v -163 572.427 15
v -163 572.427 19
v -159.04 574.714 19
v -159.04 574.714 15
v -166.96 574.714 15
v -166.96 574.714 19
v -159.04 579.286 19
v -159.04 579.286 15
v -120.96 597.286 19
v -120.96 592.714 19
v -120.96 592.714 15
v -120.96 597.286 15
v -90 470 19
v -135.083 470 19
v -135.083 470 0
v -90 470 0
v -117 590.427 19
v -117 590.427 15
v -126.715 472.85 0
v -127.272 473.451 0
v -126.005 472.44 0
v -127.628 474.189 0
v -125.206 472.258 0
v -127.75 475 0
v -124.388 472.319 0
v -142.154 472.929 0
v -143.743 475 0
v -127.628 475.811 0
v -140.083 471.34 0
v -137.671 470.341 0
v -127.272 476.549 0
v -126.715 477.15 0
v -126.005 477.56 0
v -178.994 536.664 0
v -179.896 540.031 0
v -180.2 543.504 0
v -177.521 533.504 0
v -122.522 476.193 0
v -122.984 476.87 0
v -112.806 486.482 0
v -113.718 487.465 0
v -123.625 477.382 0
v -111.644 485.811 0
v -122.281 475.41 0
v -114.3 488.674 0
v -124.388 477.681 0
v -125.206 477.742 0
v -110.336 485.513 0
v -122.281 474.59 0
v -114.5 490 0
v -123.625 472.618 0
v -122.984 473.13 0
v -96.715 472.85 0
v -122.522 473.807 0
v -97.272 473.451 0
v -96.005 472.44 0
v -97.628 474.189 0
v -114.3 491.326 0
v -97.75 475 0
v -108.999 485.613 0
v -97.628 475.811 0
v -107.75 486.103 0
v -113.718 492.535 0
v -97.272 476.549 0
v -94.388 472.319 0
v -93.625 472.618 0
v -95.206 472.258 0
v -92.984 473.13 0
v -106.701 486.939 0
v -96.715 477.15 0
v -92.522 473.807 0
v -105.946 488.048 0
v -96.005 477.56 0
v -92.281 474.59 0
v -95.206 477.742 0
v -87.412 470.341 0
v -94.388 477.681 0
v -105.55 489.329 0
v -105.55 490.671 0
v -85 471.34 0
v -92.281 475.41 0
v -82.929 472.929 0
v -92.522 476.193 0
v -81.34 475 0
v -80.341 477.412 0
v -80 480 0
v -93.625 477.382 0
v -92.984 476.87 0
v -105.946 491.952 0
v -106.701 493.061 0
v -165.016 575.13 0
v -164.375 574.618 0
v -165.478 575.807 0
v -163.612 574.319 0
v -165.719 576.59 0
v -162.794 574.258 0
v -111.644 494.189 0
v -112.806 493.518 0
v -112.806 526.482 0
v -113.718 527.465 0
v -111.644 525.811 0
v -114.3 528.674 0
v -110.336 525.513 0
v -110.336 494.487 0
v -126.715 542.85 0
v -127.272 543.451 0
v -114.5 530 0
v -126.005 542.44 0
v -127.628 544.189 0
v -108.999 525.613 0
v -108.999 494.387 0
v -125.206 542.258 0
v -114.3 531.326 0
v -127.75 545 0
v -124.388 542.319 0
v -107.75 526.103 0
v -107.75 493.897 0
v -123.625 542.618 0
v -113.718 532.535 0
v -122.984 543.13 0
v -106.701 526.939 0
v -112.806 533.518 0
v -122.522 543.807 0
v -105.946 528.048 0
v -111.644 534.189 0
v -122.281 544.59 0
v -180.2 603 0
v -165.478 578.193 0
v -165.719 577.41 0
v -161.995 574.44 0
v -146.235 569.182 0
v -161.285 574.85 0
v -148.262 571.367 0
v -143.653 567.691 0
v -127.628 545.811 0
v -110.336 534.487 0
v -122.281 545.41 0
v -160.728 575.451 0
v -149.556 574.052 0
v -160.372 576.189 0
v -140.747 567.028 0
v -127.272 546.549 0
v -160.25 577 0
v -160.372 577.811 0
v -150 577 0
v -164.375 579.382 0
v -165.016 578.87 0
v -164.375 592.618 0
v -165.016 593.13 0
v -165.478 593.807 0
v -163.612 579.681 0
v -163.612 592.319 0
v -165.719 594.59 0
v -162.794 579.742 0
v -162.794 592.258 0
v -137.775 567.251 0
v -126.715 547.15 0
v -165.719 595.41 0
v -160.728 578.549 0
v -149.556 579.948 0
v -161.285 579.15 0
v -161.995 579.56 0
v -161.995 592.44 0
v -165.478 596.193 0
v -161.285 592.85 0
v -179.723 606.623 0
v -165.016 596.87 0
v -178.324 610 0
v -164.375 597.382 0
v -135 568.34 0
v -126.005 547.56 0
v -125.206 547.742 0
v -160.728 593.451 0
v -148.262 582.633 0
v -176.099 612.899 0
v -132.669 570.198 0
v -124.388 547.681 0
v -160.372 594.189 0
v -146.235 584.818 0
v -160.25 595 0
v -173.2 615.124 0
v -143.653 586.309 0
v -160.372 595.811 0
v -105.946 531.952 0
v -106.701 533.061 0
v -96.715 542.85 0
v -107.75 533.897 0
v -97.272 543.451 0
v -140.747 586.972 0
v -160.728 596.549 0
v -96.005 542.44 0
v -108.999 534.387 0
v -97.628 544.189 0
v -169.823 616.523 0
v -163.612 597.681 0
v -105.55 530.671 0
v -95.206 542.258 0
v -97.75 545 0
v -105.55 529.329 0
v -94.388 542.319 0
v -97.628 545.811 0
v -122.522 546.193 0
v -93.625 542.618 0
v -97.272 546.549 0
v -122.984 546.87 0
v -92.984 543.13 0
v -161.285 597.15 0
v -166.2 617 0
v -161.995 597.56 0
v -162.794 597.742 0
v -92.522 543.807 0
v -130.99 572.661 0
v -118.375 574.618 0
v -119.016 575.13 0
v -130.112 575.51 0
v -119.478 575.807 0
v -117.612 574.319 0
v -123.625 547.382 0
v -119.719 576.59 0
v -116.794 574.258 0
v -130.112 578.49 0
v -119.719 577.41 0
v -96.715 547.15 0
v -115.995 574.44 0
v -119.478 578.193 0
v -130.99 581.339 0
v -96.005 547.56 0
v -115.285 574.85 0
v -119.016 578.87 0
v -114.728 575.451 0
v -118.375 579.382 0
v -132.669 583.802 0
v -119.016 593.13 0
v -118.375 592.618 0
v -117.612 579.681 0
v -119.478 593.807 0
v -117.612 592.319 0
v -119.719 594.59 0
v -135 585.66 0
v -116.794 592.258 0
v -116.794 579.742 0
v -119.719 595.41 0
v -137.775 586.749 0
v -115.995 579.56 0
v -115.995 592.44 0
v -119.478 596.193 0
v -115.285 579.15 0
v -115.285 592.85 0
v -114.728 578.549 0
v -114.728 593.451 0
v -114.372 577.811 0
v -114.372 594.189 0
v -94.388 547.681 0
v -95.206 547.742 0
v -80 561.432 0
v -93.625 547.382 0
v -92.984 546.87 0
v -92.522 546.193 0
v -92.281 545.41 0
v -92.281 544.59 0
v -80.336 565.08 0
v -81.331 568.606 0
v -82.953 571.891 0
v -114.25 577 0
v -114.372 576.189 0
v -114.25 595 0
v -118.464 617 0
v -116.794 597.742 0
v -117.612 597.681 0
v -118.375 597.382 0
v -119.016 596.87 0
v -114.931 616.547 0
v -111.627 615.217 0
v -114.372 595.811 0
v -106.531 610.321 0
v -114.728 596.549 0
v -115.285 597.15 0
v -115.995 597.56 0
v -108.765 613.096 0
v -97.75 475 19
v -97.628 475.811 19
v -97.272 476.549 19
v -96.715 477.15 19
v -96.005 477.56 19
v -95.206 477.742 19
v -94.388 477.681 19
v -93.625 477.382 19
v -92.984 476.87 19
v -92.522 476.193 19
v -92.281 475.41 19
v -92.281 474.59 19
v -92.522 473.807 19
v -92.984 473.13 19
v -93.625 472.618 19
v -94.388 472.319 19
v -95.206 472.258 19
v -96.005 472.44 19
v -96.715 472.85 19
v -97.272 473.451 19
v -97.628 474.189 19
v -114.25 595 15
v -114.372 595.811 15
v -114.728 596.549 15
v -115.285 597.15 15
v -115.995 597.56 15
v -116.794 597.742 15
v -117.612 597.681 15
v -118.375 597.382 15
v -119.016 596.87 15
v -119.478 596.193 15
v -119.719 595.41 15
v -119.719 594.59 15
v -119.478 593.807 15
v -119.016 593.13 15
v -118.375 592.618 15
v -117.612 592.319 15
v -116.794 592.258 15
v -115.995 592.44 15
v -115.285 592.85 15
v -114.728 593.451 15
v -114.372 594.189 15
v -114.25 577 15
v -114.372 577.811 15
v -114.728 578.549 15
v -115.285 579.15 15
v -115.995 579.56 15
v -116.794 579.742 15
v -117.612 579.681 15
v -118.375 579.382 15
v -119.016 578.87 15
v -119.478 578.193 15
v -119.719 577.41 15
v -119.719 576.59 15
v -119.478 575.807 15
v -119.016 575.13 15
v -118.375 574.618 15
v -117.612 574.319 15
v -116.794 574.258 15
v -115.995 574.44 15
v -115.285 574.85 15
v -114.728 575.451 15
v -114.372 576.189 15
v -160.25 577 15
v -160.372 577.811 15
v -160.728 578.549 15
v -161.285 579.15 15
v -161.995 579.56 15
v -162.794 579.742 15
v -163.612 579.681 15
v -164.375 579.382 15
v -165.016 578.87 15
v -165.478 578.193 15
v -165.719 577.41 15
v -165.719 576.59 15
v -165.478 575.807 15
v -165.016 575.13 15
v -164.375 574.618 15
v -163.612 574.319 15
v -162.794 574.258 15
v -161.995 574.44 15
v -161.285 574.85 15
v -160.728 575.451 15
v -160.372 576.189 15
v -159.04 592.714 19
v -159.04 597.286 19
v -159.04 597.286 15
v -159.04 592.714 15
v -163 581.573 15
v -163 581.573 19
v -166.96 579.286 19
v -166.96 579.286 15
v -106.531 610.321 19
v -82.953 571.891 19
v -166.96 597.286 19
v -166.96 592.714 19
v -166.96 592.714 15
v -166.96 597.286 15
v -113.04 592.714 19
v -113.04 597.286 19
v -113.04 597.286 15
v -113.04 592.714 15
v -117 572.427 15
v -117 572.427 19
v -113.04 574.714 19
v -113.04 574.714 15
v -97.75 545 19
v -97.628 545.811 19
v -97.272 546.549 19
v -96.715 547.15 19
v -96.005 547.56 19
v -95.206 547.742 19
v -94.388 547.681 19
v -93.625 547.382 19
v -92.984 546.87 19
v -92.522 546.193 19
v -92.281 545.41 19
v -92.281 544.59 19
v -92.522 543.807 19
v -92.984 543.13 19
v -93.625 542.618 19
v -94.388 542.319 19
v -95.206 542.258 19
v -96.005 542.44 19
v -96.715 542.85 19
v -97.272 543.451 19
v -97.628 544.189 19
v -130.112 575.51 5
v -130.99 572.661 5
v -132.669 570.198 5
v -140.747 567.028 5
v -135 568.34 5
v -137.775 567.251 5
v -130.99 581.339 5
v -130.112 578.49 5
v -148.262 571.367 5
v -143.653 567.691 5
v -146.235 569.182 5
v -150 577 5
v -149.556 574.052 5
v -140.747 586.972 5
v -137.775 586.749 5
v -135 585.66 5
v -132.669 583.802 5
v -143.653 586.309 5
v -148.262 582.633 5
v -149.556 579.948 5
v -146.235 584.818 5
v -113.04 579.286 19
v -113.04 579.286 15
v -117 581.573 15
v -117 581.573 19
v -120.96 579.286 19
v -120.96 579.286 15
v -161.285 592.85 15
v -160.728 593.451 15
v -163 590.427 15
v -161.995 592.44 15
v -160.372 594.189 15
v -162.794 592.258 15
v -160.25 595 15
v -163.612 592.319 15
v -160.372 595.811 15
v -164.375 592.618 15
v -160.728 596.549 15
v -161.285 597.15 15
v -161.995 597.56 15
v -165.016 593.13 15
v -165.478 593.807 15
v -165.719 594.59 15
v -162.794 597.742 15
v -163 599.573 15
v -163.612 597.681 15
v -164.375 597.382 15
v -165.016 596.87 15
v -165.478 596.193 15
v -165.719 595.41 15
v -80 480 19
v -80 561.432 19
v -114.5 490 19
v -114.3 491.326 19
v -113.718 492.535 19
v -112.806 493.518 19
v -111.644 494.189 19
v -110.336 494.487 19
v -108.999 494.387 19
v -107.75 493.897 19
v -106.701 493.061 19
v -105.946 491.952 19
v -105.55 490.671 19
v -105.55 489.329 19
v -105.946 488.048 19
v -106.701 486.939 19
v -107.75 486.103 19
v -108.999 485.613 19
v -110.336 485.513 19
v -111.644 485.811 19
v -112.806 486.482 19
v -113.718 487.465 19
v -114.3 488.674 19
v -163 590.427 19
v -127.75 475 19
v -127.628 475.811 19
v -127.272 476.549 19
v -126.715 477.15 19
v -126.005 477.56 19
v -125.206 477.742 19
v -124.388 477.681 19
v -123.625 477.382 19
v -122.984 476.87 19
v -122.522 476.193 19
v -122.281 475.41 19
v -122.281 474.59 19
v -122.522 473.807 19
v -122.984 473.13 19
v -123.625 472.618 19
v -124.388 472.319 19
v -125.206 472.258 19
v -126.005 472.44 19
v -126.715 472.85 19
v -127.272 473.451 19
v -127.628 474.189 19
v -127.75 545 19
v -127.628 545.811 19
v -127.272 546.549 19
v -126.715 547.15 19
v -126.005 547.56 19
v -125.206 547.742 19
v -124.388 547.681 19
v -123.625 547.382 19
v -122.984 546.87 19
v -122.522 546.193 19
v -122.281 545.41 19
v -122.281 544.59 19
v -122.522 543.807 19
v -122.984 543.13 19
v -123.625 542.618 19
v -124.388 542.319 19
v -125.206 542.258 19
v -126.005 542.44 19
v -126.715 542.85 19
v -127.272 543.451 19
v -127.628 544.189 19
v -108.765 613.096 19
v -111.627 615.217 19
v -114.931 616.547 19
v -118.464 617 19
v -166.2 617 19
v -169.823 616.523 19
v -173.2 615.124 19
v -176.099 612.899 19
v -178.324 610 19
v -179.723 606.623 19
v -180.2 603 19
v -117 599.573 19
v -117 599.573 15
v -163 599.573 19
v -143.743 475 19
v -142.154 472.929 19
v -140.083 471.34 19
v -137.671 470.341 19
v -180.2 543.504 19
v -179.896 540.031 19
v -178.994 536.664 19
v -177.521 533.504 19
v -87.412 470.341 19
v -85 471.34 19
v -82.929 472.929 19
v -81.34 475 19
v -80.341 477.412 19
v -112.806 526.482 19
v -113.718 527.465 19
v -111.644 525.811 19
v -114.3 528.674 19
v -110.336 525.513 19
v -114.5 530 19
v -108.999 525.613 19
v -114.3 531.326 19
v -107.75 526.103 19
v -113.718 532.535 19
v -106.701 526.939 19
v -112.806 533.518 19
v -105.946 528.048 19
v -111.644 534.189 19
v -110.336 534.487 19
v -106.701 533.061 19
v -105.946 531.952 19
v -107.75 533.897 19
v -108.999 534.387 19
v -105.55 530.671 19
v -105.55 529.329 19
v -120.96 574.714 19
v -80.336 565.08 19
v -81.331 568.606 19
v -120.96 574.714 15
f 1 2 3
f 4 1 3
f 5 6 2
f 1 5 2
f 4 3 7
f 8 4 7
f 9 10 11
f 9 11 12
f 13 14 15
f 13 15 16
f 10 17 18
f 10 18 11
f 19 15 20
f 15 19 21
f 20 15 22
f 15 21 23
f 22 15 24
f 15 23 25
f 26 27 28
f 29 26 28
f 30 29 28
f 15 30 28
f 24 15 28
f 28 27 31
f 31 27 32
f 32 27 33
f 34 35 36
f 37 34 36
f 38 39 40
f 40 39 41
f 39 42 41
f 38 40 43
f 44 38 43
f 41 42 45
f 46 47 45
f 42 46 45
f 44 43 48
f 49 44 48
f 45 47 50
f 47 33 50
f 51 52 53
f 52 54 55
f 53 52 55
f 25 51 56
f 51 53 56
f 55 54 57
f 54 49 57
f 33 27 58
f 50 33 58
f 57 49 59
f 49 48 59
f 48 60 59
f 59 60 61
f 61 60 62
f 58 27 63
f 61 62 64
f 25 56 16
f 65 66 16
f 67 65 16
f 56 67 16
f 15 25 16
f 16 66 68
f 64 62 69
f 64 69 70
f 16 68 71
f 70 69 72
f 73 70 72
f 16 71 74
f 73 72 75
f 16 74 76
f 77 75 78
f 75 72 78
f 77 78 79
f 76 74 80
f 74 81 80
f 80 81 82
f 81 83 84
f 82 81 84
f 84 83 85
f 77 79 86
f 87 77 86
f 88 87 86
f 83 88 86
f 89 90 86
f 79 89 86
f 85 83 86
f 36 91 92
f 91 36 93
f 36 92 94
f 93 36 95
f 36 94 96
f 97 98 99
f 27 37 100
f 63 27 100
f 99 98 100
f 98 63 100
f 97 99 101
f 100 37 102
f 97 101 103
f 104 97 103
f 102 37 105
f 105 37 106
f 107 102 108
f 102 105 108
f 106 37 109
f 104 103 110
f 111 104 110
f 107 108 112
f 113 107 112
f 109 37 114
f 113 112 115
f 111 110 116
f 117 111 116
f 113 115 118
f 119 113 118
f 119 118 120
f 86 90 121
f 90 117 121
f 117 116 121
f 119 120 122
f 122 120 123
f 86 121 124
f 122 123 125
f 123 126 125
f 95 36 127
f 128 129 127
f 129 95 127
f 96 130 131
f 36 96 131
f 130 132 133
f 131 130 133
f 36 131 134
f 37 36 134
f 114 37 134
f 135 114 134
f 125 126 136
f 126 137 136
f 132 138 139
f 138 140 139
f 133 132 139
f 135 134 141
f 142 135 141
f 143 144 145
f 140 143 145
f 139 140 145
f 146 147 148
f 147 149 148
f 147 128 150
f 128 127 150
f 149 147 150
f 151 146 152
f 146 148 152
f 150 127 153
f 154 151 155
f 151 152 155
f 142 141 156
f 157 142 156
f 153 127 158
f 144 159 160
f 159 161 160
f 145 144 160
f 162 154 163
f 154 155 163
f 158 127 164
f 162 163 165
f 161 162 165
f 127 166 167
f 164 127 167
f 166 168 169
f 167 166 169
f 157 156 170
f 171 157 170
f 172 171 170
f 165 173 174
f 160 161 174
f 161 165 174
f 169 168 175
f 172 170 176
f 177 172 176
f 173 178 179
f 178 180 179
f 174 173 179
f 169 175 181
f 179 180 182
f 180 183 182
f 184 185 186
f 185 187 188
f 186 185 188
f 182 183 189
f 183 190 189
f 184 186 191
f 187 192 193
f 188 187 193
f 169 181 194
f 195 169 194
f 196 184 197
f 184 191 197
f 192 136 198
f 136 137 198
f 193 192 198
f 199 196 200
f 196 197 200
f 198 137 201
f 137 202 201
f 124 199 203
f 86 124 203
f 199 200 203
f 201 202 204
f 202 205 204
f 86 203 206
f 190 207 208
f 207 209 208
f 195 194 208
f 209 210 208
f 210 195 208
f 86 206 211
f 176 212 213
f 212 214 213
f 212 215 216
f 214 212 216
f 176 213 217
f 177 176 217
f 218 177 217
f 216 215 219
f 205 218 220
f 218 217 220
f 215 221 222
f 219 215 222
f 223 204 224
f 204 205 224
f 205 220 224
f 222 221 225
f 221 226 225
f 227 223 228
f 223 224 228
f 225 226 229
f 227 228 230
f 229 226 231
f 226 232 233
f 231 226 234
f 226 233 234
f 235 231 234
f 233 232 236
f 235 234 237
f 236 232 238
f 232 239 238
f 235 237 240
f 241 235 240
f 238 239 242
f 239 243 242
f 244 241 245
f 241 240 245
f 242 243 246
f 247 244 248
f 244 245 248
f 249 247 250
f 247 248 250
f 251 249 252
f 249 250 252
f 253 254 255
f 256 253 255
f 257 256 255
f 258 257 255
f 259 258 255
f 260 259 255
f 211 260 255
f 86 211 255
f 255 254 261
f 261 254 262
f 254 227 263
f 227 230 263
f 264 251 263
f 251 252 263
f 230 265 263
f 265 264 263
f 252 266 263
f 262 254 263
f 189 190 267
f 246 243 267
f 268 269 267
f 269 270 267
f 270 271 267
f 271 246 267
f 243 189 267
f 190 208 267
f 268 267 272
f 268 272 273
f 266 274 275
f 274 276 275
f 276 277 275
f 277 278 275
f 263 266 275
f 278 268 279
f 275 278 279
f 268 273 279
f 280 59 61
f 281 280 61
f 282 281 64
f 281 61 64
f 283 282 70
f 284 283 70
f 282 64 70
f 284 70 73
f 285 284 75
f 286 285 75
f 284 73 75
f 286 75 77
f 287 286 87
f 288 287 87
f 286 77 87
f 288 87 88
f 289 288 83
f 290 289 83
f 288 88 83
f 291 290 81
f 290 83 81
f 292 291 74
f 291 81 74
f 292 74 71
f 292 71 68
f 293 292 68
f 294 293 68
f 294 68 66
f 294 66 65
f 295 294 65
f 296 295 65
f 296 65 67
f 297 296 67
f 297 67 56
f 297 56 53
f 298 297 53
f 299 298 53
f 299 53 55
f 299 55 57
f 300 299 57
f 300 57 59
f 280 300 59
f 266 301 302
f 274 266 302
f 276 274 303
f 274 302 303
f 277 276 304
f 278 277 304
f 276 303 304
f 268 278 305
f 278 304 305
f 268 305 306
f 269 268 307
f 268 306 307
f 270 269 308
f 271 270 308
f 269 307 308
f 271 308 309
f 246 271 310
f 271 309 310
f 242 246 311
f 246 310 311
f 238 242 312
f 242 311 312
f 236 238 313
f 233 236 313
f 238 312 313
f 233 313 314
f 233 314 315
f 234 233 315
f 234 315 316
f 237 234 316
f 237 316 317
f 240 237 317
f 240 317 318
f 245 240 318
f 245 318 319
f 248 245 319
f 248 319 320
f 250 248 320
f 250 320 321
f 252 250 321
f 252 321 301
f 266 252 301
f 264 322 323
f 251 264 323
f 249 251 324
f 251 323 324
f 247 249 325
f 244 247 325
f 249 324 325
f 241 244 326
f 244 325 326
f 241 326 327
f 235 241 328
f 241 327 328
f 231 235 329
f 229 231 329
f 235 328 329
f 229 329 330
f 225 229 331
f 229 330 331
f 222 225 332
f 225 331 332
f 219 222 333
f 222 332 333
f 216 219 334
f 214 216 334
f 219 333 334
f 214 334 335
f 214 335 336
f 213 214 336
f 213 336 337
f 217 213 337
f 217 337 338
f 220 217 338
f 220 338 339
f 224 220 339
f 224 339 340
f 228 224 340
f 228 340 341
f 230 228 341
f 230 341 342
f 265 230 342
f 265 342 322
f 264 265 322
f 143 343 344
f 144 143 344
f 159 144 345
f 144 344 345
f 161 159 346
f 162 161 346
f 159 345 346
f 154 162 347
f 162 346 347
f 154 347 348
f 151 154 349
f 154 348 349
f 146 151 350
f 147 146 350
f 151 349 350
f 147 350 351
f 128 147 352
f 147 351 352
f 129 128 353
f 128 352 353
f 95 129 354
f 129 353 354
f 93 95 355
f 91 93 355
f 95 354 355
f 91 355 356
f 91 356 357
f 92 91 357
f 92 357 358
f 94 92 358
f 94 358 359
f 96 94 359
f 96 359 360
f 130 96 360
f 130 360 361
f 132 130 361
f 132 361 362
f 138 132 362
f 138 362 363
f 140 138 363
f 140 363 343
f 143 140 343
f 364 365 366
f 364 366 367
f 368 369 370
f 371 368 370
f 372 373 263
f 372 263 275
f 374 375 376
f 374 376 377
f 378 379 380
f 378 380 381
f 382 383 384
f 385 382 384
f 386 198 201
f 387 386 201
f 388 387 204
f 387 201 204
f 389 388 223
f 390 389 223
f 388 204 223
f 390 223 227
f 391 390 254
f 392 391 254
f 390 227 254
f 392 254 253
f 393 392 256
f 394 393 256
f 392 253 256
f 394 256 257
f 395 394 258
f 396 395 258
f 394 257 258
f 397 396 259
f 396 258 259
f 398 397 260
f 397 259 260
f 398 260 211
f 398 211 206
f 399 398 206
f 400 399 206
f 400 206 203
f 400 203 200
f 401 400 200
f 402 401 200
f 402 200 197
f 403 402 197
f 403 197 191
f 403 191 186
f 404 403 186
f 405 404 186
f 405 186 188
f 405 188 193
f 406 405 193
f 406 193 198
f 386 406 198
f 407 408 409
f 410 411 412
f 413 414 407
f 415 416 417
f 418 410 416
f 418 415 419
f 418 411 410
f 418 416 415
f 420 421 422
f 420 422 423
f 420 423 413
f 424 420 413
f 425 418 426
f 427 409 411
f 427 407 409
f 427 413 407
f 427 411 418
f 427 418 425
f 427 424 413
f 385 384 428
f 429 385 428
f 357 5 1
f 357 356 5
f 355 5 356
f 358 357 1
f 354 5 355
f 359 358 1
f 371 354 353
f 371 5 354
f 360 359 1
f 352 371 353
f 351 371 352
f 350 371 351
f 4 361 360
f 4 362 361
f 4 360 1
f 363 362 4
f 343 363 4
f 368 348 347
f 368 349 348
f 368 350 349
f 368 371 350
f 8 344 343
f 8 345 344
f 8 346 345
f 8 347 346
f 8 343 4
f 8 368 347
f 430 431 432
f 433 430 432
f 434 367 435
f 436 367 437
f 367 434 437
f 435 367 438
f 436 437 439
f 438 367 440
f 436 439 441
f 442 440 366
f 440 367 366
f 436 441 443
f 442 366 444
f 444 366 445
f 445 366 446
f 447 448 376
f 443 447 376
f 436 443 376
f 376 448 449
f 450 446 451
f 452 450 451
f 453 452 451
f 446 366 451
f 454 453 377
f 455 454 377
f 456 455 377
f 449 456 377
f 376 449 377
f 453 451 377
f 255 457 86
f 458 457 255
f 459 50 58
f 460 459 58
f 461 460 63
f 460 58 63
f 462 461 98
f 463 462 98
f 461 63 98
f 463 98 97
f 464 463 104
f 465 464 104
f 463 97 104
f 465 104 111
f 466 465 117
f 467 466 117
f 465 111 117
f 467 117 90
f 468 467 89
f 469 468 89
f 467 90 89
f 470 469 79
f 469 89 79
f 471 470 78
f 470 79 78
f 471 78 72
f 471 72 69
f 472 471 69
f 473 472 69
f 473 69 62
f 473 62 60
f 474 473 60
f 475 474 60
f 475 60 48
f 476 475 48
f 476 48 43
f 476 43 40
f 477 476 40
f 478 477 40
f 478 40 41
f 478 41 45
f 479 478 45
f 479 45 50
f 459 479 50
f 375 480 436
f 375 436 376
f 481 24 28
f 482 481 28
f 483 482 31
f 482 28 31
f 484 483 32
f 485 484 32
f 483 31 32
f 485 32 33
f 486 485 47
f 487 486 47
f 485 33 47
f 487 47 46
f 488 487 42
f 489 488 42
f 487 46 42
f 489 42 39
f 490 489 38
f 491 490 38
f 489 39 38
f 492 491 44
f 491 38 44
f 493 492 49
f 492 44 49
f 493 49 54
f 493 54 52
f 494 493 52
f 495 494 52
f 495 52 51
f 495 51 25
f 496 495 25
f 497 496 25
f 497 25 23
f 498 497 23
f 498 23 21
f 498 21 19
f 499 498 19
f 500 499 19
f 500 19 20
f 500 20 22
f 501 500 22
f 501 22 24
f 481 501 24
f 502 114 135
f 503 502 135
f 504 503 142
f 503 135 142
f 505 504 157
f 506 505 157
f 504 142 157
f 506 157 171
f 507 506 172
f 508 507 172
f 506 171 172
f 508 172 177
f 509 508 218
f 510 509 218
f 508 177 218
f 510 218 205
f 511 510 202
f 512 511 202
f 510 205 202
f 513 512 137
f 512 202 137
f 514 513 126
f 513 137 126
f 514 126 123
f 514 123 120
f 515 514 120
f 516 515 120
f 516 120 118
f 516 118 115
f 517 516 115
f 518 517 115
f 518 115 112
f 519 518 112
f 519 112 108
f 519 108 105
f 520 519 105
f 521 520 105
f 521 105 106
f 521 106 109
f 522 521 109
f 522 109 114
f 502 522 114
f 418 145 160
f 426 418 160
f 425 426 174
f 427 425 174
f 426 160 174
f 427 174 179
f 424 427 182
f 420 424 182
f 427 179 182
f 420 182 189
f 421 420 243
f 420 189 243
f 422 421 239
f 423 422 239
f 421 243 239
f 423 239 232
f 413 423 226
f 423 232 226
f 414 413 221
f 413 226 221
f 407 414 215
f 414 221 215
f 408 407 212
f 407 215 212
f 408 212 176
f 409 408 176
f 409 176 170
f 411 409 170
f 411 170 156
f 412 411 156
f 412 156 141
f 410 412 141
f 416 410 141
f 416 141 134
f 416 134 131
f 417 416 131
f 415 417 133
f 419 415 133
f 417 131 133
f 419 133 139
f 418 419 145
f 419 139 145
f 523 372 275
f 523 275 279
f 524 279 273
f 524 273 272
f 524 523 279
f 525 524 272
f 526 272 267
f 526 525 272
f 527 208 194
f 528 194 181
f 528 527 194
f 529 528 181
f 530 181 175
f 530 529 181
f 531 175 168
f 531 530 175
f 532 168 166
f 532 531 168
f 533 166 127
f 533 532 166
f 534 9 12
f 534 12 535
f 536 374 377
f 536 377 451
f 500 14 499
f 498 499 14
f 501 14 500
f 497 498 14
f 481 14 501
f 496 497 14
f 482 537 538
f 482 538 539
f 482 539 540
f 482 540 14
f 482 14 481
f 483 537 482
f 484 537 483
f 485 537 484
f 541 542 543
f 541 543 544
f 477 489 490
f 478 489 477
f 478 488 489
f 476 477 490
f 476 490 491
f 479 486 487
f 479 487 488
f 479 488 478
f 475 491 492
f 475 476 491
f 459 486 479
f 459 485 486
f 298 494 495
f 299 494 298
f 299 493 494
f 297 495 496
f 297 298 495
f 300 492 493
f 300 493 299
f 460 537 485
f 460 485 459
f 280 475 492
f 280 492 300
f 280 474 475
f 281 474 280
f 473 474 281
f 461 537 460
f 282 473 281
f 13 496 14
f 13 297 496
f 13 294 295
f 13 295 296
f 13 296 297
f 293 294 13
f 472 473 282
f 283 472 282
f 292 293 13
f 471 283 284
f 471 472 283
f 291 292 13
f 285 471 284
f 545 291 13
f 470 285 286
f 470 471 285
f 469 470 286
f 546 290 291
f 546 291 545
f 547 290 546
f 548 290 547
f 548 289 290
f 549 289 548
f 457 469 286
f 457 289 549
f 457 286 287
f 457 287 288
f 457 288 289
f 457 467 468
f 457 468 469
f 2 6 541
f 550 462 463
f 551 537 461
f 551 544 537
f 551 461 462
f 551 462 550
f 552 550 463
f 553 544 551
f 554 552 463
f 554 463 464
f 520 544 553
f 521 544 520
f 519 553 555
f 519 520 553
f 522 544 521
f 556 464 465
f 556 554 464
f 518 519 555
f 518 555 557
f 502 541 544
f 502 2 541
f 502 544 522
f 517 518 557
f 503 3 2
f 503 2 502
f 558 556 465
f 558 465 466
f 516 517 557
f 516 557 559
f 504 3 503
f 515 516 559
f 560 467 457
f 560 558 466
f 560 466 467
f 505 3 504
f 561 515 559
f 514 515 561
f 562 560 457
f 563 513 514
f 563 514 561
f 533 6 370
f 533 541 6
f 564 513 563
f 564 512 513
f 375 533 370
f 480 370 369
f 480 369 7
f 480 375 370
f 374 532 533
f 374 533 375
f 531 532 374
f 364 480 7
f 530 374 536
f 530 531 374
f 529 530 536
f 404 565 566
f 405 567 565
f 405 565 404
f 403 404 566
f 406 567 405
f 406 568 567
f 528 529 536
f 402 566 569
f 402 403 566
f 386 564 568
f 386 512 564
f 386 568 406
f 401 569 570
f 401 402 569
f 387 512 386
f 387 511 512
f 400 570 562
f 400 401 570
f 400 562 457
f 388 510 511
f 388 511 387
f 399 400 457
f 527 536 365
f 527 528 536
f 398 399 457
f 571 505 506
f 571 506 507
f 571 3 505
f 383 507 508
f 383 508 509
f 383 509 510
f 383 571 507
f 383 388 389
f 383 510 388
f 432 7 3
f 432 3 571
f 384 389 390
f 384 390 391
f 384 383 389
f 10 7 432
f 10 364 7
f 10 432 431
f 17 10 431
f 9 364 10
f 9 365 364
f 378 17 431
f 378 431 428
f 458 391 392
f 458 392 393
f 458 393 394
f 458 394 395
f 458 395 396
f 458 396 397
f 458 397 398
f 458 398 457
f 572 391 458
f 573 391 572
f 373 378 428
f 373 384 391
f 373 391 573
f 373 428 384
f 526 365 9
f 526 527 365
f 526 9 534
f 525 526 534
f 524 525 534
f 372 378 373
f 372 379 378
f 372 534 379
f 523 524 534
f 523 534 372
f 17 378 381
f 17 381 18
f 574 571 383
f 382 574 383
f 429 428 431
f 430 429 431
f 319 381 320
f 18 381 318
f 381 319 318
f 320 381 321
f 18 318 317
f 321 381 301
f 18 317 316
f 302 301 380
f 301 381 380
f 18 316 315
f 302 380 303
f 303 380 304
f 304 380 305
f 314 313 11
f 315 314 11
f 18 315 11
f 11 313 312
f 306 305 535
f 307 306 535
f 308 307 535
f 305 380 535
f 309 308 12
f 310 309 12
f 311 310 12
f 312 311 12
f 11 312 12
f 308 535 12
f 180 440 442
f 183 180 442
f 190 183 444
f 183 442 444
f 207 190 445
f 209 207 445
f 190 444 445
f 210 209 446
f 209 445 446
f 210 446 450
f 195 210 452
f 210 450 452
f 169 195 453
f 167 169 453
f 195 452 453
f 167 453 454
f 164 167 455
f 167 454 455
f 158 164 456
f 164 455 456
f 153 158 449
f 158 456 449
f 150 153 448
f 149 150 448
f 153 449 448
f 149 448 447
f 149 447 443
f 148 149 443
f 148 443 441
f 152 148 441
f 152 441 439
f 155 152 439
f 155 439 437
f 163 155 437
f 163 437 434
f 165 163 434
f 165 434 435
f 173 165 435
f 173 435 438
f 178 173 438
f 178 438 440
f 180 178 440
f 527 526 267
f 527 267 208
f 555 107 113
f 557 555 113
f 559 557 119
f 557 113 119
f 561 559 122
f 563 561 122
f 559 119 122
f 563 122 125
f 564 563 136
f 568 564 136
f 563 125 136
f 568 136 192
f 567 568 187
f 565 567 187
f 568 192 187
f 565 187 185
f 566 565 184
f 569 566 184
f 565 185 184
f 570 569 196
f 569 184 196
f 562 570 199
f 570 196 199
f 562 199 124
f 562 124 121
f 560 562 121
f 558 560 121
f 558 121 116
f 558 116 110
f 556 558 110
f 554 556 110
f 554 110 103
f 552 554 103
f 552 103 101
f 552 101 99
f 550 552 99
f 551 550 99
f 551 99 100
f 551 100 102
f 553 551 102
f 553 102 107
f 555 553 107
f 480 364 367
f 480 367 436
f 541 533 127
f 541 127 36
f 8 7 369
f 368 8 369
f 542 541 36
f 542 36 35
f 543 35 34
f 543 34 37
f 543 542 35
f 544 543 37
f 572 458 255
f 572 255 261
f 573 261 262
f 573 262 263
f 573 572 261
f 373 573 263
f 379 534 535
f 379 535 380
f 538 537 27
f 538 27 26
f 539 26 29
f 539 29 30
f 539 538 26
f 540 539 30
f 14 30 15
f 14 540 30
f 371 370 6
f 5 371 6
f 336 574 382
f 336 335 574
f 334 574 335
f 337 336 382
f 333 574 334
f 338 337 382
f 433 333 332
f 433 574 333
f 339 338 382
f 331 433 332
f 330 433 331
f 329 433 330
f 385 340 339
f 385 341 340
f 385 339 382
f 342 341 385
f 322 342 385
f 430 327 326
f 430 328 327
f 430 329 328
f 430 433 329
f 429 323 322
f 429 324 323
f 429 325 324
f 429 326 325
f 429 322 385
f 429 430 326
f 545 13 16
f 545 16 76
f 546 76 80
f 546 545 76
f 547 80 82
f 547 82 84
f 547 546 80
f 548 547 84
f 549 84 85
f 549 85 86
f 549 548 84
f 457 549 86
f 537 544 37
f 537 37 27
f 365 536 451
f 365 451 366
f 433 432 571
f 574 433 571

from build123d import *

# Parameters (mm, degrees)
BOSS_EXTRUDE1_DEPTH  = 19
FILLET1_R            = 10
M5_CLEARANCE_HOLE2_D = 5.5
M5_CLEARANCE_HOLE1_D = 5.5
FILLET2_R            = 4
BOSS_EXTRUDE2_DEPTH  = 19
M8_CLEARANCE_HOLE1_D = 9
CUT_EXTRUDE2_DEPTH   = 4
SKETCH16_R           = 10
CUT_EXTRUDE3_DEPTH   = 5


with BuildPart() as part:
    # Sketch1 → Boss-Extrude1 (new body)
    with BuildSketch(Plane.XY):
        with BuildLine():
            Line((-170.200000001, 540.824594888), (-129.309401077, 470))
            Line((-129.309401077, 470), (-93, 470))
            ThreePointArc((-93, 470), (-90.878679656, 470.878679656), (-90, 473))
            Line((-90, 473), (-90, 564.25527297))
            Line((-90, 564.25527297), (-116.225329238, 607))
            Line((-116.225329238, 607), (-170.200000001, 607))
            Line((-170.200000001, 607), (-170.200000001, 540.824594888))
        make_face()
    extrude(amount=BOSS_EXTRUDE1_DEPTH)

    # Fillet1
    fillet1_edges = [part.edges().sort_by_distance(p)[0] for p in [
        (-90, 564.25527297, 9.5),
        (-129.309401077, 470, 9.5),
        (-170.200000001, 540.824594888, 9.5),
    ]]
    fillet(fillet1_edges, radius=FILLET1_R)

    # M5 Clearance Hole2 (through all)
    with Locations(Plane(origin=(0, 0, 0), x_dir=(-1, 0, 0), z_dir=(0, 0, -1))):
        with Locations((117.000000001, 595), (117.000000001, 577), (163.000000001, 577), (163.000000001, 595)):
            Hole(M5_CLEARANCE_HOLE2_D / 2)

    # M5 Clearance Hole1 (through all)
    with Locations(Plane.XY.offset(19)):
        with Locations((-95, 545), (-125, 545), (-125, 475), (-95, 475), (-110, 490), (-110, 530)):
            Hole(M5_CLEARANCE_HOLE1_D / 2)

    # Fillet2
    fillet2_edges = [part.edges().sort_by_distance(p)[0] for p in [
        (-116.225329238, 607, 9.5),
        (-170.200000001, 607, 9.5),
    ]]
    fillet(fillet2_edges, radius=FILLET2_R)

    # Sketch11 → Boss-Extrude2 (add)
    with BuildSketch(Plane.XY.offset(19)):
        with BuildLine():
            ThreePointArc((-143.743157806, 475), (-140.082903769, 471.339745962), (-135.082903769, 470))
            Line((-135.082903769, 470), (-123.535898385, 470))
            ThreePointArc((-123.535898385, 470), (-128.535898385, 471.339745962), (-132.196152423, 475))
            Line((-132.196152423, 475), (-168.860254039, 538.504086813))
            ThreePointArc((-168.860254039, 538.504086813), (-169.859258264, 540.915896362), (-170.200000001, 543.504086813))
            Line((-170.200000001, 543.504086813), (-170.200000001, 603))
            ThreePointArc((-170.200000001, 603), (-169.028427125, 605.828427125), (-166.200000001, 607))
            Line((-166.200000001, 607), (-118.464037729, 607))
            ThreePointArc((-118.464037729, 607), (-116.510482263, 606.490504411), (-115.054590744, 605.091810521))
            Line((-115.054590744, 605.091810521), (-91.476382537, 566.661632408))
            ThreePointArc((-91.476382537, 566.661632408), (-90.37617086, 564.149073659), (-90, 561.432106106))
            Line((-90, 561.432106106), (-90, 473))
            ThreePointArc((-90, 473), (-90.878679656, 470.878679656), (-93, 470))
            Line((-93, 470), (-90, 470))
            ThreePointArc((-90, 470), (-82.928932188, 472.928932188), (-80, 480))
            Line((-80, 480), (-80, 561.432106106))
            ThreePointArc((-80, 561.432106106), (-80.75234172, 566.866041212), (-82.952765074, 571.89115871))
            Line((-82.952765074, 571.89115871), (-106.530973281, 610.321336823))
            ThreePointArc((-106.530973281, 610.321336823), (-111.626593598, 615.216765438), (-118.464037729, 617))
            Line((-118.464037729, 617), (-166.200000001, 617))
            ThreePointArc((-166.200000001, 617), (-176.099494937, 612.899494937), (-180.200000001, 603))
            Line((-180.200000001, 603), (-180.200000001, 543.504086813))
            ThreePointArc((-180.200000001, 543.504086813), (-179.518516526, 538.327705911), (-177.520508076, 533.504086813))
            Line((-177.520508076, 533.504086813), (-143.743157806, 475))
        make_face()
    extrude(amount=-BOSS_EXTRUDE2_DEPTH)

    # M8 Clearance Hole1 (through all)
    with Locations(Plane.XY.offset(19)):
        with Locations((-110, 530), (-110, 490)):
            Hole(M8_CLEARANCE_HOLE1_D / 2)

    # Sketch15 → Cut-Extrude2 (cut)
    with BuildSketch(Plane.XY.offset(19)):
        Polygon((-166.960000001, 579.286307066), (-166.960000001, 574.713692934), (-163.000000001, 572.427385868), (-159.040000001, 574.713692934), (-159.040000001, 579.286307066), (-163.000000001, 581.572614132), align=None)
        Polygon((-120.960000001, 579.286307066), (-120.960000001, 574.713692934), (-117.000000001, 572.427385868), (-113.040000001, 574.713692934), (-113.040000001, 579.286307066), (-117.000000001, 581.572614132), align=None)
        Polygon((-113.040000001, 592.713692934), (-117.000000001, 590.427385868), (-120.960000001, 592.713692934), (-120.960000001, 597.286307066), (-117.000000001, 599.572614132), (-113.040000001, 597.286307066), align=None)
        Polygon((-163.000000001, 590.427385868), (-166.960000001, 592.713692934), (-166.960000001, 597.286307066), (-163.000000001, 599.572614132), (-159.040000001, 597.286307066), (-159.040000001, 592.713692934), align=None)
    extrude(amount=-CUT_EXTRUDE2_DEPTH, mode=Mode.SUBTRACT)

    # Sketch16 → Cut-Extrude3 (cut)
    with BuildSketch(Plane(origin=(0, 0, 0), x_dir=(-1, 0, 0), z_dir=(0, 0, -1))):
        with Locations((140.000000001, 577)):
            Circle(SKETCH16_R)
    extrude(amount=-CUT_EXTRUDE3_DEPTH, mode=Mode.SUBTRACT)


solid = part.part
